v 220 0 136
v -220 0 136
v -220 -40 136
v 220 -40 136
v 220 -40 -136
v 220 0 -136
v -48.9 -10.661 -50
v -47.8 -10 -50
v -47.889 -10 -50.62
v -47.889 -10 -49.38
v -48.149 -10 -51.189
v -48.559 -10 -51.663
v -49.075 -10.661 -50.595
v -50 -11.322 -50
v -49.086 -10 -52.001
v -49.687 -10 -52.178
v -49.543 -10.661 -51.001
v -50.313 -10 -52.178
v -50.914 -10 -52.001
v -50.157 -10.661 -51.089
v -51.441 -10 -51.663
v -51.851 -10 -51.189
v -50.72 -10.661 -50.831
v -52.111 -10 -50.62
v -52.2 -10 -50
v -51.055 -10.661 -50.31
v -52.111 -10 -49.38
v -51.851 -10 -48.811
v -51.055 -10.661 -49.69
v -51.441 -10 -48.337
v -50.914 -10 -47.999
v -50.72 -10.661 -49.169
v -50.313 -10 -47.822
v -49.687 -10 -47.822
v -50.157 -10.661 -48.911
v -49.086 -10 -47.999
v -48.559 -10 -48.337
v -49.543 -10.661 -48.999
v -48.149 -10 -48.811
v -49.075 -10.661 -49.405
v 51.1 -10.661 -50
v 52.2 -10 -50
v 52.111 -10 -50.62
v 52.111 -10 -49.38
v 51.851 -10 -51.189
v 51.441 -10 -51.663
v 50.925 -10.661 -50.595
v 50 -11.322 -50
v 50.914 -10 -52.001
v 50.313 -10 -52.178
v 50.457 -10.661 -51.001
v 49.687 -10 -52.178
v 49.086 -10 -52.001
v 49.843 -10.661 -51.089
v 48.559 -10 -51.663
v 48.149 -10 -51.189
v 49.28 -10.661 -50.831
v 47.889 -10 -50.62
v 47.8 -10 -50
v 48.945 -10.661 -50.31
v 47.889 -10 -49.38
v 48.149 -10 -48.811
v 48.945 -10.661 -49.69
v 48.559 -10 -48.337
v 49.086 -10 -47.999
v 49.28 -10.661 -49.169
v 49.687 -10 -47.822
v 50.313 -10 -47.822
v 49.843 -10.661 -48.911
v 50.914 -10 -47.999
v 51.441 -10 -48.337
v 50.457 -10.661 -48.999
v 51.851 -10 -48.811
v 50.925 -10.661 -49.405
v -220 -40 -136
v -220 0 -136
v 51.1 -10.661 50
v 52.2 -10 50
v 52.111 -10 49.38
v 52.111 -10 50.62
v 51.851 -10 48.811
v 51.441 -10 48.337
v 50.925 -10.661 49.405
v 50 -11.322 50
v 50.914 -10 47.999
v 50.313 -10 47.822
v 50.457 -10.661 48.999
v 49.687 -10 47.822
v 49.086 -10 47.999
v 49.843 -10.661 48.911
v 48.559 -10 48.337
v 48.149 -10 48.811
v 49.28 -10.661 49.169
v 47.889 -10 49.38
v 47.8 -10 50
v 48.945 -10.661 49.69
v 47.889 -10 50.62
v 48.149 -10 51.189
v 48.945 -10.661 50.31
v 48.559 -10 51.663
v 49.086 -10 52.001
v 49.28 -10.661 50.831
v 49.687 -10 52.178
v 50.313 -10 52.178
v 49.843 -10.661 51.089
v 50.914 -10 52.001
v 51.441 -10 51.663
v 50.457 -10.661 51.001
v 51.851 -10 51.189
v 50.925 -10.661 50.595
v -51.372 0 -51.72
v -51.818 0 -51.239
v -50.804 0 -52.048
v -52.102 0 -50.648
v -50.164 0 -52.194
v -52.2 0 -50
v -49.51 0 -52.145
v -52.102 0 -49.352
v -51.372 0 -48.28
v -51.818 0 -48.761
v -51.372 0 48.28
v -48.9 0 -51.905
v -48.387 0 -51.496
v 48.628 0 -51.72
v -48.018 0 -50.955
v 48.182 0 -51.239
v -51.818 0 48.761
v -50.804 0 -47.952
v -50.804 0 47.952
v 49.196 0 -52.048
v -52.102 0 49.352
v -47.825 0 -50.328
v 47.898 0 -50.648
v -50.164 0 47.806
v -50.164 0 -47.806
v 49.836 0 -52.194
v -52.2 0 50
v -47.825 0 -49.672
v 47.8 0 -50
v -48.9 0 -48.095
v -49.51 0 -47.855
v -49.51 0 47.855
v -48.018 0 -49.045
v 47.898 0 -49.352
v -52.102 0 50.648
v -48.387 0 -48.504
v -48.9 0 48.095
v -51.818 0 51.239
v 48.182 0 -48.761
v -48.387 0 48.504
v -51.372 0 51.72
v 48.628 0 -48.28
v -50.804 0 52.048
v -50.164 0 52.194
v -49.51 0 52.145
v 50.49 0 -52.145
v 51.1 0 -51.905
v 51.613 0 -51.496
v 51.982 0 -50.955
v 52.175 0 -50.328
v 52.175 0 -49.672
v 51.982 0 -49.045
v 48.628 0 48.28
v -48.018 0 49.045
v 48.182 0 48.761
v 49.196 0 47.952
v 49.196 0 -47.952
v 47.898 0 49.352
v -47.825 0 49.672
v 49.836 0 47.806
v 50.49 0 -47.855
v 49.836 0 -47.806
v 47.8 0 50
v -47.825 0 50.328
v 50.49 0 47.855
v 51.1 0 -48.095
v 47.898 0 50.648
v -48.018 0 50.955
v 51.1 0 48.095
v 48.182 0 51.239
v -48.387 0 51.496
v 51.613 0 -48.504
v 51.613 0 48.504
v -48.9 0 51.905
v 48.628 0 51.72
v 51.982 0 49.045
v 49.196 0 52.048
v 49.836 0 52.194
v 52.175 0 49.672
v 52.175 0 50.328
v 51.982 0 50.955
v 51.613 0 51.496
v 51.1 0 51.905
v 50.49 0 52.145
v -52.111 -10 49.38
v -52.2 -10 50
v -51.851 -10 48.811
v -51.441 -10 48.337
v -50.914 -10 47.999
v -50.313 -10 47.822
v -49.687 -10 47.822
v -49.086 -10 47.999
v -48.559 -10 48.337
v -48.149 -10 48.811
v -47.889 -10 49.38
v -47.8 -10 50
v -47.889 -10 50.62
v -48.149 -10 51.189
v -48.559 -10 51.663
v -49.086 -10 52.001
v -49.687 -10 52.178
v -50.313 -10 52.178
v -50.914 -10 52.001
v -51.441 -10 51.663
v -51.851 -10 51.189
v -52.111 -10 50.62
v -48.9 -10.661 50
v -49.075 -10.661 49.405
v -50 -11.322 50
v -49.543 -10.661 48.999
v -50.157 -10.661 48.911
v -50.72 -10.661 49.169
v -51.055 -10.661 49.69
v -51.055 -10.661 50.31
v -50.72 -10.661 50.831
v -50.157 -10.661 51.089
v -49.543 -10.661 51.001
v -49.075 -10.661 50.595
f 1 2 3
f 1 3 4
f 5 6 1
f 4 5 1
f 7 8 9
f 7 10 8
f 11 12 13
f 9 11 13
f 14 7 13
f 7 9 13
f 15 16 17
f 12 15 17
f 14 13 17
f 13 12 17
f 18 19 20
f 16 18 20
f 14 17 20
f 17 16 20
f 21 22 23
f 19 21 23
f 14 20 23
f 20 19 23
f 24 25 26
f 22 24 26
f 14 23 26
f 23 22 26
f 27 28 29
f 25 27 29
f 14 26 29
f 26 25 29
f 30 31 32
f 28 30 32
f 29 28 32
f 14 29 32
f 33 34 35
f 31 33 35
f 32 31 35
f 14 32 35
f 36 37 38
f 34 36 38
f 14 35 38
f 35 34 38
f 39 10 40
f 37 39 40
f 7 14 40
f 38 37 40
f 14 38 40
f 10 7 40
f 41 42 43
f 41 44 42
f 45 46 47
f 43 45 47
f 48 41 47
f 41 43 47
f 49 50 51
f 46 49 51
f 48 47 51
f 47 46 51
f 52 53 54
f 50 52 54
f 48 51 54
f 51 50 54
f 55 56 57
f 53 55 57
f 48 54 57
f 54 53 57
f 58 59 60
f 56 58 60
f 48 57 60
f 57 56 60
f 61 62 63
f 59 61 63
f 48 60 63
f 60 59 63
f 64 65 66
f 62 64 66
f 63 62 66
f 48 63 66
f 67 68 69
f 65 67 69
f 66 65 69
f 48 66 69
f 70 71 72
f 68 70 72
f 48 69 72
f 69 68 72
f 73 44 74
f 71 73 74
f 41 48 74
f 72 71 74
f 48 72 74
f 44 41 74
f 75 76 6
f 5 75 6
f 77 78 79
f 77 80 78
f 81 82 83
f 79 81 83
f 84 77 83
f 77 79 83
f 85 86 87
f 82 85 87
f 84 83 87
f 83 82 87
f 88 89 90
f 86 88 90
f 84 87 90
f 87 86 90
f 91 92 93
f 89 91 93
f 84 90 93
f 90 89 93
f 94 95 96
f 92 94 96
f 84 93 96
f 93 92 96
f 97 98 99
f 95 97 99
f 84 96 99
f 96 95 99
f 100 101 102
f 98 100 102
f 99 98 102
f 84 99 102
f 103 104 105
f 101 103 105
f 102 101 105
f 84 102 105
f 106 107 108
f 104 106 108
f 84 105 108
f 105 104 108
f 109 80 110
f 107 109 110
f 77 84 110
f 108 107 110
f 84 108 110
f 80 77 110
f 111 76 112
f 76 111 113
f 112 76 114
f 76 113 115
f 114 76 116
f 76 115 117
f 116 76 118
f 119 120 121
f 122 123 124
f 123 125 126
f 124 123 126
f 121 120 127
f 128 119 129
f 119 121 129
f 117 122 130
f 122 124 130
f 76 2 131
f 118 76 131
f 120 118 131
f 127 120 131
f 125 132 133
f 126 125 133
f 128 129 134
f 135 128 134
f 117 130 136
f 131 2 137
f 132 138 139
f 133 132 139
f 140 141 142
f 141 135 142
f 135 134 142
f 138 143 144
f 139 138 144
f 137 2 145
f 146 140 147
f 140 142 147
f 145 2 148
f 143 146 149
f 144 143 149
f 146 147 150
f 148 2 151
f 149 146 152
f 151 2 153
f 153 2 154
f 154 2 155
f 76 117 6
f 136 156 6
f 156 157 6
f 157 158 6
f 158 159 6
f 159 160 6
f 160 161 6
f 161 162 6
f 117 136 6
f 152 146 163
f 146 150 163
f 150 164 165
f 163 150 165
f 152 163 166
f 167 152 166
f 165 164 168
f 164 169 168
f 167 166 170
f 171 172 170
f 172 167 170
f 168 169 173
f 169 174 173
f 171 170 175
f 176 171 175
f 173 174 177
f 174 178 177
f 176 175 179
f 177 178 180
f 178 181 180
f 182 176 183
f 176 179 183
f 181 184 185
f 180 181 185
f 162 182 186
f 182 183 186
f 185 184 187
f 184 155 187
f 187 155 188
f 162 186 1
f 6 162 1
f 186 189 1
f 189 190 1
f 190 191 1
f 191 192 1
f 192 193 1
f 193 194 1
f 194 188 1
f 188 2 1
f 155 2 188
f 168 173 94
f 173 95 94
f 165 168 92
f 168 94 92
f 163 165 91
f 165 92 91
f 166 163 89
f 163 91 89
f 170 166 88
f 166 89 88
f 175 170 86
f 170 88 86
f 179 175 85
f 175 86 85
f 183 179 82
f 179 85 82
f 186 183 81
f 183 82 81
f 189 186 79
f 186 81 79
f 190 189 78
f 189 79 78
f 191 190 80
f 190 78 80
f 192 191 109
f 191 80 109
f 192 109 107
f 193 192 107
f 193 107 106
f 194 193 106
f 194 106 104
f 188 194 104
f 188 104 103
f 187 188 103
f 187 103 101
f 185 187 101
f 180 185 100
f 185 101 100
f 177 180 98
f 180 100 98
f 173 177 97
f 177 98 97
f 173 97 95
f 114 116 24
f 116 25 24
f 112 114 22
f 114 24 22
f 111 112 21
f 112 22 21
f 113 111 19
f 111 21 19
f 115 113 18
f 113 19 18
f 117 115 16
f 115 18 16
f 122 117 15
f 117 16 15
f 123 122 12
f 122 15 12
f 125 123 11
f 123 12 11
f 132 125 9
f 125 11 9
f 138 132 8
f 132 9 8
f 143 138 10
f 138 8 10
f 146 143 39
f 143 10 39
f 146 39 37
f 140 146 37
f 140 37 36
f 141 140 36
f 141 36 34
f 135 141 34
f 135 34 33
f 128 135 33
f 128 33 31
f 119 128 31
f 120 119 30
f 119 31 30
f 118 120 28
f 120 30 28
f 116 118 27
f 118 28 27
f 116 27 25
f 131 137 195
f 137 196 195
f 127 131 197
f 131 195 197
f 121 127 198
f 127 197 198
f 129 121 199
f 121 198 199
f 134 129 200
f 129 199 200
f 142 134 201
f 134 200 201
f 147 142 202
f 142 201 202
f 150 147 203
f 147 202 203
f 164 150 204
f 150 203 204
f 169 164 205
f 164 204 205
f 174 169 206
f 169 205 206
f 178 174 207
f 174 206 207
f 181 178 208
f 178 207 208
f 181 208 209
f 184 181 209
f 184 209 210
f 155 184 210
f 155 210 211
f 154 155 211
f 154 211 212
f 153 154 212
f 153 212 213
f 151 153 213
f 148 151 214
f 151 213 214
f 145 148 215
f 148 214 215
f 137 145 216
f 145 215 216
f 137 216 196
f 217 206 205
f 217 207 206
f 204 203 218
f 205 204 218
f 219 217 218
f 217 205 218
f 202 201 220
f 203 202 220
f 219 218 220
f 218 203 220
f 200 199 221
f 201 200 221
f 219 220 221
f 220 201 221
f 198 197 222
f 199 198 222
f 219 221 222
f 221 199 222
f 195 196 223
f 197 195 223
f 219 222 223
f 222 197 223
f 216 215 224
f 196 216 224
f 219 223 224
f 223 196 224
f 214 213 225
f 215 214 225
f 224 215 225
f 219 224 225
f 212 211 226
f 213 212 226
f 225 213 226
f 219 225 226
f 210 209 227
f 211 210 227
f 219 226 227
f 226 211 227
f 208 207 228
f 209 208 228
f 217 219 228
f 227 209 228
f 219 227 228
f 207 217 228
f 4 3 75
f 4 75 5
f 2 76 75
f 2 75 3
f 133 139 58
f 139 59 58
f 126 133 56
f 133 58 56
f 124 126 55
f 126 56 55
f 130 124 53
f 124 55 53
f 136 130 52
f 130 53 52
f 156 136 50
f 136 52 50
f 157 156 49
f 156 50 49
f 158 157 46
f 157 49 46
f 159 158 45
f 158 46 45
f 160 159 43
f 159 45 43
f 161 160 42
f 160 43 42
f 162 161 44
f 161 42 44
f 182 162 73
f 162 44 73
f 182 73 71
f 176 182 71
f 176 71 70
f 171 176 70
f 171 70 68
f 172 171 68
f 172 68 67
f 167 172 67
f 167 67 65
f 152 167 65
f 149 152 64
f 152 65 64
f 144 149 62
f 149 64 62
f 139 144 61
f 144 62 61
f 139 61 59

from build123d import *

# Parameters (mm, degrees)
F0_W     = 440
F0_H     = 272
F1_DEPTH = 40
F2_D     = 4.4
F2_DEPTH = 10
F2_TIP   = 1.3218933619


with BuildPart() as f1:
    # F0 (on Front) → F1 (new body)
    with BuildSketch(Plane.XZ):
        Rectangle(F0_W, F0_H)
    extrude(amount=F1_DEPTH)

    # F2
    with Locations(Plane(origin=(0, 0, 0), x_dir=(1, 0, 0), z_dir=(0, 1, 0))):
        with Locations((50, -50), (-50, -50), (-50, 50), (50, 50)):
            Hole(F2_D / 2, depth=F2_DEPTH)
            with Locations((0, 0, -(F2_DEPTH + F2_TIP / 2))):  # 118° drill point
                Cone(0, F2_D / 2, F2_TIP, mode=Mode.SUBTRACT)


solid = f1.part
